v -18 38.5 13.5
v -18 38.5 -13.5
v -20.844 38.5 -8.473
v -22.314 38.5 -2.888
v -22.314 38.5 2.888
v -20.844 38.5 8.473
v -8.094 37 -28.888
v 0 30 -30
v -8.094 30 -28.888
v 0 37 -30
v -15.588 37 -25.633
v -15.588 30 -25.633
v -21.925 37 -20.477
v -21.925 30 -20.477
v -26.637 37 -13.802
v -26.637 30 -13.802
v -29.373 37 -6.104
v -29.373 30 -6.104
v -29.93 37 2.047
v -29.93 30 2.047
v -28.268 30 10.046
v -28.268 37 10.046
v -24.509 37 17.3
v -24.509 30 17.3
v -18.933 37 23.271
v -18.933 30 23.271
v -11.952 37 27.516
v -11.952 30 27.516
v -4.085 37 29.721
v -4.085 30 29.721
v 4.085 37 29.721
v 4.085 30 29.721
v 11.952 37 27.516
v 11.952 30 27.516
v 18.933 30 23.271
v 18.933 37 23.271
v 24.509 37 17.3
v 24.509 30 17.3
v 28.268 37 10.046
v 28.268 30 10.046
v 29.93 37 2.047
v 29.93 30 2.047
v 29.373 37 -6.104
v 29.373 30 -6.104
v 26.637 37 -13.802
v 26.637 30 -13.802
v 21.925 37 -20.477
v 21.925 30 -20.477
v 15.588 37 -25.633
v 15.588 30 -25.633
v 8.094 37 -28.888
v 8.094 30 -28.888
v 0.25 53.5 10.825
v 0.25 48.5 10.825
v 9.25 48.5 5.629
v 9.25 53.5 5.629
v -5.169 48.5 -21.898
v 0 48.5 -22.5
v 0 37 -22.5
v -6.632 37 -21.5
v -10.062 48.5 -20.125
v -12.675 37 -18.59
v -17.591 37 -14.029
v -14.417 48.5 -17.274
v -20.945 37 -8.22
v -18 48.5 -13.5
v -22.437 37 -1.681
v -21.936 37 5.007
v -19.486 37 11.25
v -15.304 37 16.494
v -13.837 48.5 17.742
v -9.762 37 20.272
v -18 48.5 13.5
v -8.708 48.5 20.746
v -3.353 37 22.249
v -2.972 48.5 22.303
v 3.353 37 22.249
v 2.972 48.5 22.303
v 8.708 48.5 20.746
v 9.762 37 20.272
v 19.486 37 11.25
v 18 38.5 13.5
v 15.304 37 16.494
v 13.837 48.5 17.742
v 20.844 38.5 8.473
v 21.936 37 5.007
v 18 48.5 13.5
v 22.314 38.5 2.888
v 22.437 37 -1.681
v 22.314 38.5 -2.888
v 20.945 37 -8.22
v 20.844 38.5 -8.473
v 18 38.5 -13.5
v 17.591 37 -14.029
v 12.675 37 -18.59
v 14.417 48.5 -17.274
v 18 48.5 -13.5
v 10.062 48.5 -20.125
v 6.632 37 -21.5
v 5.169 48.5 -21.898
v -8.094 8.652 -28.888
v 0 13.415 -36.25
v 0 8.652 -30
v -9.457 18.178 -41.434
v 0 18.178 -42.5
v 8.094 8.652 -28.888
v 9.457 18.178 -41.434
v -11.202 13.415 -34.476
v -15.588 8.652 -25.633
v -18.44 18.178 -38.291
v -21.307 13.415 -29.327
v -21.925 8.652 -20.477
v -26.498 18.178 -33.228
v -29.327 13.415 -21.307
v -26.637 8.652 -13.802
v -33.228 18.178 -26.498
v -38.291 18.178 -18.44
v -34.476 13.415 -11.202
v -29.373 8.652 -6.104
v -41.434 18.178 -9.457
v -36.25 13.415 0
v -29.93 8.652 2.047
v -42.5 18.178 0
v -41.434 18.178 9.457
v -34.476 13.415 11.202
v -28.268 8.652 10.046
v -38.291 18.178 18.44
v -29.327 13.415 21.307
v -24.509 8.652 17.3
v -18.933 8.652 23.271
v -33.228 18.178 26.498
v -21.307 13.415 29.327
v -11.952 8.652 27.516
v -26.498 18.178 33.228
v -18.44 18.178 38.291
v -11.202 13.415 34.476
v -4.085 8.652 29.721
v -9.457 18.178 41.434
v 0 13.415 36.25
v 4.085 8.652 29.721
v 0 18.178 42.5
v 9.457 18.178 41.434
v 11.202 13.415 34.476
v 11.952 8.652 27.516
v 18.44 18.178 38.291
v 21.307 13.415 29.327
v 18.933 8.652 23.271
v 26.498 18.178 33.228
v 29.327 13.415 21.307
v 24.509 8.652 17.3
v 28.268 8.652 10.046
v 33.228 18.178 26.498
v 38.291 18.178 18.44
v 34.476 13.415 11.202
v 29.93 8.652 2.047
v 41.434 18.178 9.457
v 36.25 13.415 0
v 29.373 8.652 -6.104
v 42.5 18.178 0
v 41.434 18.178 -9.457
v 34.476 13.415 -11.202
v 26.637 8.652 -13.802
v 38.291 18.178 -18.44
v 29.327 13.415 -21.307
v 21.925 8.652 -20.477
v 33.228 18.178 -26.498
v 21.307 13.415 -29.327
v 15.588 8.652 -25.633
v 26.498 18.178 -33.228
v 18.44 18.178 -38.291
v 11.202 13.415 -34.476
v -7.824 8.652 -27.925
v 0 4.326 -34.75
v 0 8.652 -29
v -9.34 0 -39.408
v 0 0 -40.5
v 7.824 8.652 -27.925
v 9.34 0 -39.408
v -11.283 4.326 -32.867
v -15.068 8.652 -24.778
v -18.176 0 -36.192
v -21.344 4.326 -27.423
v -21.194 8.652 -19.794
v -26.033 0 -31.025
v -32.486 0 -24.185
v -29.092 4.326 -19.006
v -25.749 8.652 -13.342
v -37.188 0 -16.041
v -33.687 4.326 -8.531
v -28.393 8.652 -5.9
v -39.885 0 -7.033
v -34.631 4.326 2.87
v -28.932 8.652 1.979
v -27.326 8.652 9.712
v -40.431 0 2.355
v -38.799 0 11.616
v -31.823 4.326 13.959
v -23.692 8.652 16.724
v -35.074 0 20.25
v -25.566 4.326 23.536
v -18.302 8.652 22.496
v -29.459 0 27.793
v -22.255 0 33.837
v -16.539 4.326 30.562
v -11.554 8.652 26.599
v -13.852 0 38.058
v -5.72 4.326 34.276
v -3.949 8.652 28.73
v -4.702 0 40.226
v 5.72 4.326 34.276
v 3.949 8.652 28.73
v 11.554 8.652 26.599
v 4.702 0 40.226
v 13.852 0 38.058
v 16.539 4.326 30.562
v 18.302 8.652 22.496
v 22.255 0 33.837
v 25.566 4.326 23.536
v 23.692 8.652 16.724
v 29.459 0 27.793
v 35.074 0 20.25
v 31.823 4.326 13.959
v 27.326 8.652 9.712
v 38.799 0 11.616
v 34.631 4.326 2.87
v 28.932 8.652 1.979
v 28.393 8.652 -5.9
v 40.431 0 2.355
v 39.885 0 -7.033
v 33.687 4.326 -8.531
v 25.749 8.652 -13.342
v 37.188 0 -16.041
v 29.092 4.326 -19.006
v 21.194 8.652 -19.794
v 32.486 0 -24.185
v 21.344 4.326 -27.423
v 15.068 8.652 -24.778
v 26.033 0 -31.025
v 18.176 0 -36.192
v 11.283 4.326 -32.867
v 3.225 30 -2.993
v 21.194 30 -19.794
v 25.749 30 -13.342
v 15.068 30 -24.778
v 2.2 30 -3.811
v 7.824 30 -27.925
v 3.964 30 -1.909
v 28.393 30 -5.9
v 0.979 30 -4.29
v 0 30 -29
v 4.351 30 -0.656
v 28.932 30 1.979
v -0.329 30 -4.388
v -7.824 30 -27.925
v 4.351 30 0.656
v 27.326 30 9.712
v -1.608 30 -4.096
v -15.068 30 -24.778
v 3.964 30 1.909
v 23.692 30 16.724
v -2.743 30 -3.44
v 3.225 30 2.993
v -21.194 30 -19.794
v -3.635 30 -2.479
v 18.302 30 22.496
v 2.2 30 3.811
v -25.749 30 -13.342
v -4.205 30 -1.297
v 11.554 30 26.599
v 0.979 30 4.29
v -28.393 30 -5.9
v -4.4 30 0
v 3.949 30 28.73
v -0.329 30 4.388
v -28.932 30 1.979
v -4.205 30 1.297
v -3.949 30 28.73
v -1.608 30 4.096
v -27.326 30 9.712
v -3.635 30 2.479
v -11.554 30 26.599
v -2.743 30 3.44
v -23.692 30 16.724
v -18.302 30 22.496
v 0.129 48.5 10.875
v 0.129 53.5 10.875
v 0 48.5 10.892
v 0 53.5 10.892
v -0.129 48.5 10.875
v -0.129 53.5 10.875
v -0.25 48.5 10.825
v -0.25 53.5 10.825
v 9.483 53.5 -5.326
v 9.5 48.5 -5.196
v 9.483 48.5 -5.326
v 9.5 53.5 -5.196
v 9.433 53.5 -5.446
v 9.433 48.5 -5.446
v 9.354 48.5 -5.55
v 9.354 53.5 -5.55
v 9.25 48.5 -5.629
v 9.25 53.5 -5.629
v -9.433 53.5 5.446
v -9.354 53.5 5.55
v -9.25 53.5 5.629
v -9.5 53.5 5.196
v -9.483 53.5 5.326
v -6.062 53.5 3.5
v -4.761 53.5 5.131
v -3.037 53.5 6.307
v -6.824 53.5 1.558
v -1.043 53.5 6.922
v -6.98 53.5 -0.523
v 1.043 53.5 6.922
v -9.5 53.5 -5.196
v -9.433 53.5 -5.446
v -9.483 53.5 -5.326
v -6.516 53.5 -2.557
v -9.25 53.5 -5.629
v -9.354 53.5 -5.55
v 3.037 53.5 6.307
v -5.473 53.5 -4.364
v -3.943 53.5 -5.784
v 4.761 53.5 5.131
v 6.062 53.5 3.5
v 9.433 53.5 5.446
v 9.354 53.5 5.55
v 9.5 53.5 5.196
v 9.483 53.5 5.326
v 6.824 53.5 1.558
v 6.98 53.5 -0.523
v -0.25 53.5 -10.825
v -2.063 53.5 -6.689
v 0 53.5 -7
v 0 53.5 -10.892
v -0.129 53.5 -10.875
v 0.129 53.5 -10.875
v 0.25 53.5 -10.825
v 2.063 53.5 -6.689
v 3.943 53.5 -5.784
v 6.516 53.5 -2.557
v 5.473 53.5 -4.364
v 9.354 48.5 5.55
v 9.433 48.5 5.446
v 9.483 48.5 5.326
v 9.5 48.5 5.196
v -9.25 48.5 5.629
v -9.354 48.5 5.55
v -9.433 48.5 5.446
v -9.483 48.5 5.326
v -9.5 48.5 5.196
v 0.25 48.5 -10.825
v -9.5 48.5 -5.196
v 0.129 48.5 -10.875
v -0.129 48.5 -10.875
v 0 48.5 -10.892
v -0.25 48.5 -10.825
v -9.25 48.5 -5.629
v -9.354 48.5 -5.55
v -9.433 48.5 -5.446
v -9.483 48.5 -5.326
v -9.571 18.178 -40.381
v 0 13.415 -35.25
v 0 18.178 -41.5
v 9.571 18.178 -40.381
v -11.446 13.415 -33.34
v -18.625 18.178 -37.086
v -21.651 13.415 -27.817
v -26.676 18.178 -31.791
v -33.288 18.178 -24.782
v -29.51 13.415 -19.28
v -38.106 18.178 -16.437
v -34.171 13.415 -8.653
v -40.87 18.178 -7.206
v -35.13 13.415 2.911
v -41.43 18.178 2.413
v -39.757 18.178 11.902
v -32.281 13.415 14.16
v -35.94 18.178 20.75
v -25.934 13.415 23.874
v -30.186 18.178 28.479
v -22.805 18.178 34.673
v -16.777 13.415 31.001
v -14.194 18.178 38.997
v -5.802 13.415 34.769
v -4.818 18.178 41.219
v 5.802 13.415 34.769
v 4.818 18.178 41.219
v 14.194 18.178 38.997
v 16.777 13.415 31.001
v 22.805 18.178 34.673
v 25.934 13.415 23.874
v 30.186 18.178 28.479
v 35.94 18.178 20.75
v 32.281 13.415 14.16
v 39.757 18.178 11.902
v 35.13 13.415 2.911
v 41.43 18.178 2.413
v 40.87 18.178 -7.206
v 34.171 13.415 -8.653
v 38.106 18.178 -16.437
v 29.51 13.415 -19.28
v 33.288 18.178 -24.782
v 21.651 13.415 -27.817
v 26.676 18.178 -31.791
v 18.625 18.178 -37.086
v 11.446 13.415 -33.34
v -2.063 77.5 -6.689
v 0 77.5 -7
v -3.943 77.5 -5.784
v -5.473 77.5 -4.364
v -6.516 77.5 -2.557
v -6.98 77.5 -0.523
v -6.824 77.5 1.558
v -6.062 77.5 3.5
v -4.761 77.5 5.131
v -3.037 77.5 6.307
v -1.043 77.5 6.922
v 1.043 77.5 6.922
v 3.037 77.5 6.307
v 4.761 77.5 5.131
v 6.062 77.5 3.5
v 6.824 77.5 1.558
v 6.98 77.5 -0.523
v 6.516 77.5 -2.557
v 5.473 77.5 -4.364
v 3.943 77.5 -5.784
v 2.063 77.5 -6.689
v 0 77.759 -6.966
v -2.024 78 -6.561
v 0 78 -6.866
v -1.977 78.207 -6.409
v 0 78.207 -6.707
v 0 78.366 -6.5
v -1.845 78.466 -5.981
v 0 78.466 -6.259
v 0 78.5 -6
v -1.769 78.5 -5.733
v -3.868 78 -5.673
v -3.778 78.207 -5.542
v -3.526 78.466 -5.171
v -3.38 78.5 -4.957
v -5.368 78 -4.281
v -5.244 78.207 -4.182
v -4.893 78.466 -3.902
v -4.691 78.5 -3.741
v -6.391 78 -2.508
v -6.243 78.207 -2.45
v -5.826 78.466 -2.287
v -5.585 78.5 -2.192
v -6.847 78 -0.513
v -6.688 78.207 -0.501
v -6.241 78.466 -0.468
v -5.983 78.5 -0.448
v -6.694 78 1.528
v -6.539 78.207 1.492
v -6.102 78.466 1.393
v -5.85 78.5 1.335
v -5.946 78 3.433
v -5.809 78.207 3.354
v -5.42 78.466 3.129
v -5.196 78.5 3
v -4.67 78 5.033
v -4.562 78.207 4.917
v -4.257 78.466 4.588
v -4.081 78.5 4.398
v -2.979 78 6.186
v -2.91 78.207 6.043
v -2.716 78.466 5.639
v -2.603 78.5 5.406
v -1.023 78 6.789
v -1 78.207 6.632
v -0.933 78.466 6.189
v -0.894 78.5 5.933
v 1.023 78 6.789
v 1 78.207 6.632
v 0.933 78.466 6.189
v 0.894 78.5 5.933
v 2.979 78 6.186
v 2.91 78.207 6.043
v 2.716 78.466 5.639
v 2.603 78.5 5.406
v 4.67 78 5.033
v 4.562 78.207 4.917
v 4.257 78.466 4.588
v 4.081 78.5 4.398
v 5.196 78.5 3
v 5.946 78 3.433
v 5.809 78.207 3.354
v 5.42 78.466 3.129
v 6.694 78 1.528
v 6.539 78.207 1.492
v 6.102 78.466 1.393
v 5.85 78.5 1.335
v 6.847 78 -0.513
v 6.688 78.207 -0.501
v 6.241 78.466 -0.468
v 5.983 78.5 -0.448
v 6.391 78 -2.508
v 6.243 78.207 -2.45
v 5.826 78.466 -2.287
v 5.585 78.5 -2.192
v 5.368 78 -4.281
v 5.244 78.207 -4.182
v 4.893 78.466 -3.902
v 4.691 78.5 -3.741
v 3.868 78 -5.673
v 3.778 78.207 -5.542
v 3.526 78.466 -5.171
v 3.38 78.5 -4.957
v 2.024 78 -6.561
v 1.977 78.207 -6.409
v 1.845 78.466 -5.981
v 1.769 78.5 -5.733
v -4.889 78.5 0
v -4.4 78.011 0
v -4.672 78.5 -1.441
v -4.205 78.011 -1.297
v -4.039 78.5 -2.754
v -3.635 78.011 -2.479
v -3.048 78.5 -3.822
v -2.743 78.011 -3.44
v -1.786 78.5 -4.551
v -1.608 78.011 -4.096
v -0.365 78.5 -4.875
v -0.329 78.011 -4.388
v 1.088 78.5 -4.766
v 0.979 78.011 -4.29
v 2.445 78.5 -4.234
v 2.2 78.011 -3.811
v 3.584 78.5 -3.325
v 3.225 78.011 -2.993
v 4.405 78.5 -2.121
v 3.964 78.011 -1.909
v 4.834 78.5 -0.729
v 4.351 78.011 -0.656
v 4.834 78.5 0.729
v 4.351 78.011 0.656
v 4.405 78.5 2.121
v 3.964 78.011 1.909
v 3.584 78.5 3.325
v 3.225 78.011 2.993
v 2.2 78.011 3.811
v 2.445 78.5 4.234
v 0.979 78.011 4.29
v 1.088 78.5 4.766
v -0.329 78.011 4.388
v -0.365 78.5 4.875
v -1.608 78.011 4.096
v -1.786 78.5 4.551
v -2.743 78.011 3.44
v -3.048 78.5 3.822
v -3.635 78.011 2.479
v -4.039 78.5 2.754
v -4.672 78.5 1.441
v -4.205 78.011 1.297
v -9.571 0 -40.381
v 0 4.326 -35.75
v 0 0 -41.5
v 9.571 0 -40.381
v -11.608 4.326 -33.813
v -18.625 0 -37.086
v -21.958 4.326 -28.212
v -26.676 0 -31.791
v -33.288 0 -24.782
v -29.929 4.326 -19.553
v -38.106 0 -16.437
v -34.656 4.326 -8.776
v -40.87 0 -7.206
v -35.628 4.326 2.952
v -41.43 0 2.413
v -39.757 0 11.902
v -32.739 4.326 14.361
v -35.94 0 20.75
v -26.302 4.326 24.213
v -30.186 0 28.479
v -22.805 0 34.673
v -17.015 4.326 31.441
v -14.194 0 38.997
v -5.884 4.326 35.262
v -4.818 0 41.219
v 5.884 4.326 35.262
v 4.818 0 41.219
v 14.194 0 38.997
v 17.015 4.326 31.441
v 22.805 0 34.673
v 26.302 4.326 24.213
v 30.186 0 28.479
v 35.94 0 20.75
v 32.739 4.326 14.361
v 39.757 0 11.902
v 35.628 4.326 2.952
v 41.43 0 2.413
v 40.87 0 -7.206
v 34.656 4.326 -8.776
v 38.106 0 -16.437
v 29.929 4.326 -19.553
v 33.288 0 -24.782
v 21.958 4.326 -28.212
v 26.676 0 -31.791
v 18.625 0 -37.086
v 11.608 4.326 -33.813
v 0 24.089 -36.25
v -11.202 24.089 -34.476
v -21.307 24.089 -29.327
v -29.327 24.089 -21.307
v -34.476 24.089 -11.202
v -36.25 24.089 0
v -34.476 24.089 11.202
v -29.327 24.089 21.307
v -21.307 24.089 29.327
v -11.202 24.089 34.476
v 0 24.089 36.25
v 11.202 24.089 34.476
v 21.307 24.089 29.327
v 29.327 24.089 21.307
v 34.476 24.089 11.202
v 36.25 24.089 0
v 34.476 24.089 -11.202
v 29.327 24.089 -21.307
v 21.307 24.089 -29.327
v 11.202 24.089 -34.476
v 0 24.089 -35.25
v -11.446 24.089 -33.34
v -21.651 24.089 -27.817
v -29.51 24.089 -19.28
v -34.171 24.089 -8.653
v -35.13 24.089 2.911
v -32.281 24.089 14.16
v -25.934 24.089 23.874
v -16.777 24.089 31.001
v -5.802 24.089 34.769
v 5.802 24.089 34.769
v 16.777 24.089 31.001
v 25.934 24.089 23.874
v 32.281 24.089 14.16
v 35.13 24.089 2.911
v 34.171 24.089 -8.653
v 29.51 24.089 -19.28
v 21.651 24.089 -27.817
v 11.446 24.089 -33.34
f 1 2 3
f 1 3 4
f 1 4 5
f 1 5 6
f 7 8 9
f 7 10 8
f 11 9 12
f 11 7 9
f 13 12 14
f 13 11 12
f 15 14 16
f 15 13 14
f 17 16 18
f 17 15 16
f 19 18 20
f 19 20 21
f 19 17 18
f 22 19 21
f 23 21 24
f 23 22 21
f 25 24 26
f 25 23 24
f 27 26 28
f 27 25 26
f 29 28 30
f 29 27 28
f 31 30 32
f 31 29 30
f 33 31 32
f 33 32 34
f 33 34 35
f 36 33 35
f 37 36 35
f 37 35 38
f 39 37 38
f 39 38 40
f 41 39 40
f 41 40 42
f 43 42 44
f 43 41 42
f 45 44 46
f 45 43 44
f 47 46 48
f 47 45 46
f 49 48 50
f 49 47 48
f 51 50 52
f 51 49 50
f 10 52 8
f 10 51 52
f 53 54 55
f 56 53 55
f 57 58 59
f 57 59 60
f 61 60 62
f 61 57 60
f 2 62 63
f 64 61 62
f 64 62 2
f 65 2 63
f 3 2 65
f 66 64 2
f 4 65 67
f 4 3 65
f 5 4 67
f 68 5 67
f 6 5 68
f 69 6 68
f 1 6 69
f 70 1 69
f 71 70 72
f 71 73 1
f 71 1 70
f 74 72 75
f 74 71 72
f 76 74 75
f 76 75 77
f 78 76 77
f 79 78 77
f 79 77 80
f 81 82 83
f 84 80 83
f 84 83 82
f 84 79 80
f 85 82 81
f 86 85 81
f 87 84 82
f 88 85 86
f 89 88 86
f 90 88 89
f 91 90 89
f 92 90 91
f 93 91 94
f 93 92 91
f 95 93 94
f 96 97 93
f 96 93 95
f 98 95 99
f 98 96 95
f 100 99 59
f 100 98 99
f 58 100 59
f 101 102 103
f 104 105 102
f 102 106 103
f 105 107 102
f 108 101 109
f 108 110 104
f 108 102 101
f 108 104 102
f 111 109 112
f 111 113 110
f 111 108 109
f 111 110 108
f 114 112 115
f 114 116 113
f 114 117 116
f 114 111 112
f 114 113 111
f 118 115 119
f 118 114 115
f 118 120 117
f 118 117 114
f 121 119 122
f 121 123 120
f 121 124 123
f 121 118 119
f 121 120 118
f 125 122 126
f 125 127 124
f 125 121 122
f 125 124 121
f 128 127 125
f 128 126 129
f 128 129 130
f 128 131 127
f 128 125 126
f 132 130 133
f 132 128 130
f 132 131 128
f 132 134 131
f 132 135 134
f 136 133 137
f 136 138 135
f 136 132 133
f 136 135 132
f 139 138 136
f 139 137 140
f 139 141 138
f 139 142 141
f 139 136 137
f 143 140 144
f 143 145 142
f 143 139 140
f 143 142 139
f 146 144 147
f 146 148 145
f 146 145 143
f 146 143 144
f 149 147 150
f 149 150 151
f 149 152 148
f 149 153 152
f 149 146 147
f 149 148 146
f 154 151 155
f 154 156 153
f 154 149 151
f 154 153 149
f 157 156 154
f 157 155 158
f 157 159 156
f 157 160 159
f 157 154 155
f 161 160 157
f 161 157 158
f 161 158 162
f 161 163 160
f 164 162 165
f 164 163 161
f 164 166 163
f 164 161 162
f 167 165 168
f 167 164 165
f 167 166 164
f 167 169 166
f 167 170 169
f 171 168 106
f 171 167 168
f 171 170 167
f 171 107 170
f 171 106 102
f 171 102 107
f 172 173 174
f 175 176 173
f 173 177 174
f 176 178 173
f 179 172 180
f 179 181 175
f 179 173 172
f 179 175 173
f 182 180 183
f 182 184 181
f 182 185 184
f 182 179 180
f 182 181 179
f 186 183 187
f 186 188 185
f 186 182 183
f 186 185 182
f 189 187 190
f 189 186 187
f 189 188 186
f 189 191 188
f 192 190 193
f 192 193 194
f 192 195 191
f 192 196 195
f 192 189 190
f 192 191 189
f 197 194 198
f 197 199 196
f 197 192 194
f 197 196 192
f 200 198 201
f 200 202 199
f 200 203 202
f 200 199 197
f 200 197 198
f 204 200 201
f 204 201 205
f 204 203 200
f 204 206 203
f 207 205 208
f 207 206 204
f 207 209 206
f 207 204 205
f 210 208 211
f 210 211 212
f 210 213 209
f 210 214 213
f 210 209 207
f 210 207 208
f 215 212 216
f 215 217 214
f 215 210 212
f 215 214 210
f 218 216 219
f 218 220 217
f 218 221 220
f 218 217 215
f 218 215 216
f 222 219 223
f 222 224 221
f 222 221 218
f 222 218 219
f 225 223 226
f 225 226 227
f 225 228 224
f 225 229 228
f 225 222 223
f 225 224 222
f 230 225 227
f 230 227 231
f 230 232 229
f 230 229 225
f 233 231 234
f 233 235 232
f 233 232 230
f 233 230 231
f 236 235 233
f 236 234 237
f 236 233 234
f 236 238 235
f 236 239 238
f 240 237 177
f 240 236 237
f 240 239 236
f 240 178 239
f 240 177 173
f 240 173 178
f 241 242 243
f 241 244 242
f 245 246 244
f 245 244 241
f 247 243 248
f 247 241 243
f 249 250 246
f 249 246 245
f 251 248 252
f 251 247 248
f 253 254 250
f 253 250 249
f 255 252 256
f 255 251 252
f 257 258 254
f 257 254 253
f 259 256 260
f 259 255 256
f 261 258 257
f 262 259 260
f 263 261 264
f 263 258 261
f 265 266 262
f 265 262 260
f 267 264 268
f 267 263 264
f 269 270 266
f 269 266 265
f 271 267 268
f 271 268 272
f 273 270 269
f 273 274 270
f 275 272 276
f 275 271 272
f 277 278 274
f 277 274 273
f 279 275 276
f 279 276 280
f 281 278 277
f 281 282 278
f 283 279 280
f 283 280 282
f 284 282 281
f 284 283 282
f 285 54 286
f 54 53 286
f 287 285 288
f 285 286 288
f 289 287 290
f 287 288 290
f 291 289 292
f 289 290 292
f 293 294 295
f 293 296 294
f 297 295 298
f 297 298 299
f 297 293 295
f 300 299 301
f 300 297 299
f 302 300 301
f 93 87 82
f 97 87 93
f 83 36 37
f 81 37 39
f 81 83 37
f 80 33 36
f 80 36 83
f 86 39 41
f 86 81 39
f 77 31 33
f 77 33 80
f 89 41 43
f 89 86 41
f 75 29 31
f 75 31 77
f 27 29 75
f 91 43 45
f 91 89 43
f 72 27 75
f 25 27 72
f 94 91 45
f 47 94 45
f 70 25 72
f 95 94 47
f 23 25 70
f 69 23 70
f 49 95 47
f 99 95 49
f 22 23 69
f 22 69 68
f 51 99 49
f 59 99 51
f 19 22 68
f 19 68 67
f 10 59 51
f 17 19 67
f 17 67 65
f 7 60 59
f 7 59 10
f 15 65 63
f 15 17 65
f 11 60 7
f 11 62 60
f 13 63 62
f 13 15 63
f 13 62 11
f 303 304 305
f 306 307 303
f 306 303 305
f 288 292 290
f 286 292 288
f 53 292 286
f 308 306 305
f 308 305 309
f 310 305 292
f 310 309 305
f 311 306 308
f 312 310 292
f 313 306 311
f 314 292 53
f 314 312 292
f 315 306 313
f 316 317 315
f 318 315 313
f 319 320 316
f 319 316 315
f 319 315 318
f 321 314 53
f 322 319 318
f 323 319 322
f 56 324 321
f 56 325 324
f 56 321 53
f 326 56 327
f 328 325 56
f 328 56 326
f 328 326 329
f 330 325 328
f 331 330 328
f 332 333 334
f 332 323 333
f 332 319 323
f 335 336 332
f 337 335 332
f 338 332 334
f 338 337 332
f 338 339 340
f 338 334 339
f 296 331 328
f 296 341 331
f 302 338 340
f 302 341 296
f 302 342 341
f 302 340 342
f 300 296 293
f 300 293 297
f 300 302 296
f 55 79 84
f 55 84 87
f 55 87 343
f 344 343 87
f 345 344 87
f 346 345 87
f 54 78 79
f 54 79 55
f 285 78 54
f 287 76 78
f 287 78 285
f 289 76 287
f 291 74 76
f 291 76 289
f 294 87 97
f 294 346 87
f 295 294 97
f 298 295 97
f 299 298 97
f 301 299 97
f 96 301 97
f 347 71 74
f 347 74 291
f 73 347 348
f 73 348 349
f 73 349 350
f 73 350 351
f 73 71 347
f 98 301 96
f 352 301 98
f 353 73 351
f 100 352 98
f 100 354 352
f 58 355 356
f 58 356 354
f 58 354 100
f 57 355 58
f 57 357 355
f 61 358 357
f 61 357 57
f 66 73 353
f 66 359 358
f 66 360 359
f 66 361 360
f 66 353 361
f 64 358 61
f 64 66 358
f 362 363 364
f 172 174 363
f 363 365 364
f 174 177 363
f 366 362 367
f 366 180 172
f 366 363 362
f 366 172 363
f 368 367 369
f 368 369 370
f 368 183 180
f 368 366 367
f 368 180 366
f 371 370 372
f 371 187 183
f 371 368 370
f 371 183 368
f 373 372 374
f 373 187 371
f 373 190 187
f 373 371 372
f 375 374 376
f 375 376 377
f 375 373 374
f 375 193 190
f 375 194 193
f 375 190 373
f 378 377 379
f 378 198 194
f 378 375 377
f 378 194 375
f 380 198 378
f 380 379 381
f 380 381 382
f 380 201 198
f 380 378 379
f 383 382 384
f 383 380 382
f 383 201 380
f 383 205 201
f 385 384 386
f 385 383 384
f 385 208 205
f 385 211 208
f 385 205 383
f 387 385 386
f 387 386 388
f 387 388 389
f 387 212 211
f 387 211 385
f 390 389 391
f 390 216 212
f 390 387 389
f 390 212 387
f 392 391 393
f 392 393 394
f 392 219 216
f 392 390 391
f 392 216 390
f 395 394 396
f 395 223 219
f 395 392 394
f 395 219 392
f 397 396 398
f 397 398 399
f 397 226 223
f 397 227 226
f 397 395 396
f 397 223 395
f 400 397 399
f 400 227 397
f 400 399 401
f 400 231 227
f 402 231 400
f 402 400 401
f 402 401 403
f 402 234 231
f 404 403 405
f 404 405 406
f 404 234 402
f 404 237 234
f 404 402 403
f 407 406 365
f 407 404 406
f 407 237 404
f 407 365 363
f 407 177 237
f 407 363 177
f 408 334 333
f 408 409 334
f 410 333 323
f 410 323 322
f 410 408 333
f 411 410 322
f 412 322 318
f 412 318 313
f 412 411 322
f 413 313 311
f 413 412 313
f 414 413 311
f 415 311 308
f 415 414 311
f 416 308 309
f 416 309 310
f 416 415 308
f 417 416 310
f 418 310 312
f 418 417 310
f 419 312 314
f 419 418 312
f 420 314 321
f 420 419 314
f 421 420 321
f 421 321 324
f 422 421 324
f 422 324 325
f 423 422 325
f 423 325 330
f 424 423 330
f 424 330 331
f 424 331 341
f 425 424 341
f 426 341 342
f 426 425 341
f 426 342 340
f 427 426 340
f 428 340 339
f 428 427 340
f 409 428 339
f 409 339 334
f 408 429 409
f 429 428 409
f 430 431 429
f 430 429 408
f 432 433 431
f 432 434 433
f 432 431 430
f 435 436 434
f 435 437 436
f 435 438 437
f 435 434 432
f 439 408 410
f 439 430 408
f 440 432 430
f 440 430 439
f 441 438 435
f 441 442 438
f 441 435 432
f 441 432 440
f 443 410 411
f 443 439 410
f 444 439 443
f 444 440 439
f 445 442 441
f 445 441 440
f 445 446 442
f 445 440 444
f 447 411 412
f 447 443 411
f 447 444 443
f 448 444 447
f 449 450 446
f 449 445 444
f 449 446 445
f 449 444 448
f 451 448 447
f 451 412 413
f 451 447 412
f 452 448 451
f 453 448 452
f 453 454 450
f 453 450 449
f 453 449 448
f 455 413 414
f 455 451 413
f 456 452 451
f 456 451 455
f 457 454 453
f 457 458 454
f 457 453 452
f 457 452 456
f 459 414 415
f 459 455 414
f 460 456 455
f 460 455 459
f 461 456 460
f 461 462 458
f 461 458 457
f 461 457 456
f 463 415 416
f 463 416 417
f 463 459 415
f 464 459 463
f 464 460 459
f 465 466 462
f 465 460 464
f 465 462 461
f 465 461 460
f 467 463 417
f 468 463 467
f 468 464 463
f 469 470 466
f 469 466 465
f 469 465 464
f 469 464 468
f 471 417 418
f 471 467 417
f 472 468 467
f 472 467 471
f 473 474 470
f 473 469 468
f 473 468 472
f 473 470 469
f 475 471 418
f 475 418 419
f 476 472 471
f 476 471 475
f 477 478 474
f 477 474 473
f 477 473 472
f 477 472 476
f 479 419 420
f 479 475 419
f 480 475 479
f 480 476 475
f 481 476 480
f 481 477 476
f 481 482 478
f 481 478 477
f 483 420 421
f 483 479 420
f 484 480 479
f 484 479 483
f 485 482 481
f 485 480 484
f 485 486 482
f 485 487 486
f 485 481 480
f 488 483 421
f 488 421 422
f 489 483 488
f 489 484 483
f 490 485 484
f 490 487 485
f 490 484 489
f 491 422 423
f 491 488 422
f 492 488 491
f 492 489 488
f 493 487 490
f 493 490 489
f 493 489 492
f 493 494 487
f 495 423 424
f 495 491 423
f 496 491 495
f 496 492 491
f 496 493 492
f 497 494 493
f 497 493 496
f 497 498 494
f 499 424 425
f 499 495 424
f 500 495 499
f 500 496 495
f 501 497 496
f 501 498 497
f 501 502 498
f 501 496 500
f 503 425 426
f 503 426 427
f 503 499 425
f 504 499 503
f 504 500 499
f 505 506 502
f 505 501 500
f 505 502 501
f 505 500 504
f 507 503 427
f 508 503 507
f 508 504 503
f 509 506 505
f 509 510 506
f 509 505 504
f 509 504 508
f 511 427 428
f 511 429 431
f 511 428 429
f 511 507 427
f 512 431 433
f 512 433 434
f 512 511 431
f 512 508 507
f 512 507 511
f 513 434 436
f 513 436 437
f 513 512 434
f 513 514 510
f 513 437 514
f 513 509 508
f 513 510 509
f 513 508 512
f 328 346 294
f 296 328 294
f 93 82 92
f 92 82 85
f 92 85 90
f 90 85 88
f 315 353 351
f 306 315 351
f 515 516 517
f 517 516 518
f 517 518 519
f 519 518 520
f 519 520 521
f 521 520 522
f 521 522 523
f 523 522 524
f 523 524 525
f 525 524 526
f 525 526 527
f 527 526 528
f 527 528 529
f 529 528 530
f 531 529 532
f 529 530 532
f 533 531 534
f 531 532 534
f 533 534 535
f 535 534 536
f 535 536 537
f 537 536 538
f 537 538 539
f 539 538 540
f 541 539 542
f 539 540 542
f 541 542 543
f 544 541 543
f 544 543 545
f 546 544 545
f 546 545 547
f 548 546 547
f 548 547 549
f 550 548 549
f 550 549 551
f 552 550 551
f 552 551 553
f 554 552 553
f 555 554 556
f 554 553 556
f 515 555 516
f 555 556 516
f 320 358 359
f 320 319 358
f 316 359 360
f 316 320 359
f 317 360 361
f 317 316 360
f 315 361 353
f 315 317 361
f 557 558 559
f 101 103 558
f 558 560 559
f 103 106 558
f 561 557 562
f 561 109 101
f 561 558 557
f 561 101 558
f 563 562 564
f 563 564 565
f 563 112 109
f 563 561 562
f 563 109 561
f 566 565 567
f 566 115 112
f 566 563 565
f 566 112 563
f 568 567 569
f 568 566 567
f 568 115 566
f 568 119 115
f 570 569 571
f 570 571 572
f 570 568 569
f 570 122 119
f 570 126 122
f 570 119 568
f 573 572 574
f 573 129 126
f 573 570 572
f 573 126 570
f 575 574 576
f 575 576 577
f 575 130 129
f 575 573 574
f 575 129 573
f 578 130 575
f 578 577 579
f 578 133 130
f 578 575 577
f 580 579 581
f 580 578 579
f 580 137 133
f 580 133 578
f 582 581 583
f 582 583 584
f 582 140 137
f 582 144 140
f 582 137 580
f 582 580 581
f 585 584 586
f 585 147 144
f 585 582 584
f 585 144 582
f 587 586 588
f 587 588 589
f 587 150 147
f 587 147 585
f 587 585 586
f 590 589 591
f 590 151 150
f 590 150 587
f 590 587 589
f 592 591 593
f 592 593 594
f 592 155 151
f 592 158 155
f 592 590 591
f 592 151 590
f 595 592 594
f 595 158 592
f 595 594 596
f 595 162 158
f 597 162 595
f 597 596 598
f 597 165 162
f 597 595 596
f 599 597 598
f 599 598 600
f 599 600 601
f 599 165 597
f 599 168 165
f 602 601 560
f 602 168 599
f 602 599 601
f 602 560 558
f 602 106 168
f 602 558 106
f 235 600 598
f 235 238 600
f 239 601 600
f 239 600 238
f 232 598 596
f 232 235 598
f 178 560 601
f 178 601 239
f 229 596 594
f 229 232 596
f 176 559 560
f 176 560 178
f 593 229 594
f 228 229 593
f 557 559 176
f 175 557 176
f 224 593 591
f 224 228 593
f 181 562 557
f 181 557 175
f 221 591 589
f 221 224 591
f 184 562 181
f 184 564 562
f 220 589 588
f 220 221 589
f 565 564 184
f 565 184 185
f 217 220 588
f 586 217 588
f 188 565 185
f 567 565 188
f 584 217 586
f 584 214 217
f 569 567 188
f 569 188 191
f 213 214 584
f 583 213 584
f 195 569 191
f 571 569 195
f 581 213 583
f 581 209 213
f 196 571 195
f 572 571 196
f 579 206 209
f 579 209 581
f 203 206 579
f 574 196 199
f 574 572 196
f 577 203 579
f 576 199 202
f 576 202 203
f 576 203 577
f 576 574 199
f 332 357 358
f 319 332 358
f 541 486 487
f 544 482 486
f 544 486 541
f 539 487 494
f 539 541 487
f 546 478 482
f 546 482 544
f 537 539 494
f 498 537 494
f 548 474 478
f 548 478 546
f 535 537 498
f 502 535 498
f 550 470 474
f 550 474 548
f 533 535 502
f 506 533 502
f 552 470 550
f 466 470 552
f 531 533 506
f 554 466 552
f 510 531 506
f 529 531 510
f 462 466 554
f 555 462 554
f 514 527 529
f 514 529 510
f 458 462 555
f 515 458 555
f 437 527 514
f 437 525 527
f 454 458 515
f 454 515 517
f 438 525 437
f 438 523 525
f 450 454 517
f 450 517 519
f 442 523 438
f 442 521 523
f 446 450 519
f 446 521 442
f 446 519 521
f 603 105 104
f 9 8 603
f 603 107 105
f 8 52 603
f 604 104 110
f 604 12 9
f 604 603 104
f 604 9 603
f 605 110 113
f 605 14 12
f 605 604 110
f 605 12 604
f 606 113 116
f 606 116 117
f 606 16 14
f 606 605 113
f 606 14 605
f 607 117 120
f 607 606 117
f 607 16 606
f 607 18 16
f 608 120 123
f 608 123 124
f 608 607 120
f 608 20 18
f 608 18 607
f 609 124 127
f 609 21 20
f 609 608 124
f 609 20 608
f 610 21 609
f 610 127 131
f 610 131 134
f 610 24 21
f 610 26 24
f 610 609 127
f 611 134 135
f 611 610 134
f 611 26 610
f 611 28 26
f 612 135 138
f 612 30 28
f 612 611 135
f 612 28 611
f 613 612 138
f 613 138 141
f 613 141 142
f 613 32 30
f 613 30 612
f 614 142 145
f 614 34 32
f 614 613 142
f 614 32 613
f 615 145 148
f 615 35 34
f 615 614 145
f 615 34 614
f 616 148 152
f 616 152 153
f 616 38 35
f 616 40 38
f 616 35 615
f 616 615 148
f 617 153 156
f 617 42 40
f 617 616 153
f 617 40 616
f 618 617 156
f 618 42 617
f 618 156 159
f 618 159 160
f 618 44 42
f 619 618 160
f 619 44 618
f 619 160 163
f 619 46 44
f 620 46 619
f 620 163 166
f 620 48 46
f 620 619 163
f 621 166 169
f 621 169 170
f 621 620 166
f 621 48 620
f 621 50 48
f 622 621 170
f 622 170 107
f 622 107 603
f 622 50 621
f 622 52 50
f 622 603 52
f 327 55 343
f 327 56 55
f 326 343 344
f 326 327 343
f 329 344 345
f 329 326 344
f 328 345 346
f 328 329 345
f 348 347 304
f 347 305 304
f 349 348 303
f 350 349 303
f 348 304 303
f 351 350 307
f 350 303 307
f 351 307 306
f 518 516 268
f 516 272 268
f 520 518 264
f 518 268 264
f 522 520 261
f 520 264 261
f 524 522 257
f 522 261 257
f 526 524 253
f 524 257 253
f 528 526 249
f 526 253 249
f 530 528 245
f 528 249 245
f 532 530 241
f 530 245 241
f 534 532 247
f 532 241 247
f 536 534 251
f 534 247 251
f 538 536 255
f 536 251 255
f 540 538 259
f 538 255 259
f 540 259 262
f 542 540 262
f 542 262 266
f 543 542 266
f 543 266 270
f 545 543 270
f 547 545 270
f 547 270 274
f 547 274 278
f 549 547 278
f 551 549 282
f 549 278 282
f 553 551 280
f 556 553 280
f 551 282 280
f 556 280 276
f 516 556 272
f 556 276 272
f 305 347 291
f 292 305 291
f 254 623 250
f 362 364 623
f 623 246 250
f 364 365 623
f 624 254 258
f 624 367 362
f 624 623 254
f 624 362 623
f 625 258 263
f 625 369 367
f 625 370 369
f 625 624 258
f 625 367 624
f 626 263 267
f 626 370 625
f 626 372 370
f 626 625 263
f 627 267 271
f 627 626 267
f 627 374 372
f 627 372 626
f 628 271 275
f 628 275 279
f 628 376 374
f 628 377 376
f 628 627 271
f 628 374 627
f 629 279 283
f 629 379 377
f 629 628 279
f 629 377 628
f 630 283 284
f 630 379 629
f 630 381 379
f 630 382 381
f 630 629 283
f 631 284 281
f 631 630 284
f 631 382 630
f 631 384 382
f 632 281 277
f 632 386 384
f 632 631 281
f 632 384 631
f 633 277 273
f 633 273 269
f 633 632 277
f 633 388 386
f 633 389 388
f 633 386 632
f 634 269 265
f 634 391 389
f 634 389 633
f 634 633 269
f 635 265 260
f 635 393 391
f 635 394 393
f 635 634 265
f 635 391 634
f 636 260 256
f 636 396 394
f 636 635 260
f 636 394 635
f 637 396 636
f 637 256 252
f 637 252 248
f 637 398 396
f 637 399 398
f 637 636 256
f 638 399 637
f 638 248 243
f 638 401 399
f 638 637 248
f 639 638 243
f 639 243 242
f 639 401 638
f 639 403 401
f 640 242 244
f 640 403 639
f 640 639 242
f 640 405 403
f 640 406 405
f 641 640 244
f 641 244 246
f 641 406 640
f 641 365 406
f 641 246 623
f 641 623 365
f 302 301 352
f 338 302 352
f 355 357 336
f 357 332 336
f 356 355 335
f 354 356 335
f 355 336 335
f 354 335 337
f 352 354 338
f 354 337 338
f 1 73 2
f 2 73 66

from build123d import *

# Parameters (mm, degrees)
HOLE_WIZARD_G1_8_1_D           = 8.8
HOLE_WIZARD_G1_8_1_CSINK_D     = 9.778
HOLE_WIZARD_G1_8_1_CSINK_ANGLE = 90
FILLET_1_R                     = 1
SKETCH_5_W                     = 32.896271037
SKETCH_5_H                     = 64.386050675
CUT_EXTRUDE_1_DEPTH            = 10
SKETCH_6_R                     = 4.4
EXTRUDE_1_DEPTH                = 5
FILLET_2_R                     = 0.5


with BuildPart() as part:
    # 草图1 → 旋转2 (revolve)
    with BuildSketch(Plane.XY, mode=Mode.PRIVATE) as revolve_2_sk:
        Polygon((-40.5, 0), (-41.5, 0), (-30, 8.651787717), (-42.5, 18.178475316), (-30, 30), (-30, 37), (-22.5, 37), (-22.5, 48.5), (-7, 48.5), (-7, 78.5), (0, 78.5), (0, 30), (-29, 30), (-41.5, 18.178475316), (-29, 8.651787717), align=None)
    revolve(revolve_2_sk.sketch.rotate(Axis((0, 0, 0), (0, 1, 0)), 270), axis=Axis((0, 0, 0), (0, 1, 0)))

    # G1/8 螺纹孔1 (through all)
    with Locations(Plane(origin=(0, 78.5, 0), x_dir=(1, 0, 0), z_dir=(0, 1, 0))):
        with Locations((0, 0)):
            CounterSinkHole(HOLE_WIZARD_G1_8_1_D / 2, HOLE_WIZARD_G1_8_1_CSINK_D / 2, counter_sink_angle=HOLE_WIZARD_G1_8_1_CSINK_ANGLE)

    # 圆角1
    fillet_1_edges = [part.edges().sort_by_distance(p)[0] for p in [
        (0, 78.5, 7),
    ]]
    fillet(fillet_1_edges, radius=FILLET_1_R)

    # 草图5 → 切除-拉伸1 (cut)
    with BuildSketch(Plane(origin=(0, 48.5, 0), x_dir=(1, 0, 0), z_dir=(0, 1, 0))):
        with Locations((-34.448135519, 0.195346028)):
            Rectangle(SKETCH_5_W, SKETCH_5_H)
        with Locations((34.448135519, 0.195346028)):
            Rectangle(SKETCH_5_W, SKETCH_5_H)
    extrude(amount=-CUT_EXTRUDE_1_DEPTH, mode=Mode.SUBTRACT)

    # 草图6 → 凸台-拉伸1 (add)
    with BuildSketch(Plane(origin=(0, 48.5, 0), x_dir=(1, 0, 0), z_dir=(0, 1, 0))):
        Polygon((0, 10.969655115), (-9.5, 5.484827557), (-9.5, -5.484827557), (0, -10.969655115), (9.5, -5.484827557), (9.5, 5.484827557), align=None)
        with Locations(Location((0, 0, 0), (0, 0, 270))):
            Circle(SKETCH_6_R, mode=Mode.SUBTRACT)
    extrude(amount=EXTRUDE_1_DEPTH)

    # 圆角2
    fillet_2_edges = [part.edges().sort_by_distance(p)[0] for p in [
        (9.5, 51, -5.484827557),
        (0, 51, -10.969655115),
        (-9.5, 51, -5.484827557),
        (-9.5, 51, 5.484827557),
        (0, 51, 10.969655115),
        (9.5, 51, 5.484827557),
    ]]
    fillet(fillet_2_edges, radius=FILLET_2_R)


solid = part.part
